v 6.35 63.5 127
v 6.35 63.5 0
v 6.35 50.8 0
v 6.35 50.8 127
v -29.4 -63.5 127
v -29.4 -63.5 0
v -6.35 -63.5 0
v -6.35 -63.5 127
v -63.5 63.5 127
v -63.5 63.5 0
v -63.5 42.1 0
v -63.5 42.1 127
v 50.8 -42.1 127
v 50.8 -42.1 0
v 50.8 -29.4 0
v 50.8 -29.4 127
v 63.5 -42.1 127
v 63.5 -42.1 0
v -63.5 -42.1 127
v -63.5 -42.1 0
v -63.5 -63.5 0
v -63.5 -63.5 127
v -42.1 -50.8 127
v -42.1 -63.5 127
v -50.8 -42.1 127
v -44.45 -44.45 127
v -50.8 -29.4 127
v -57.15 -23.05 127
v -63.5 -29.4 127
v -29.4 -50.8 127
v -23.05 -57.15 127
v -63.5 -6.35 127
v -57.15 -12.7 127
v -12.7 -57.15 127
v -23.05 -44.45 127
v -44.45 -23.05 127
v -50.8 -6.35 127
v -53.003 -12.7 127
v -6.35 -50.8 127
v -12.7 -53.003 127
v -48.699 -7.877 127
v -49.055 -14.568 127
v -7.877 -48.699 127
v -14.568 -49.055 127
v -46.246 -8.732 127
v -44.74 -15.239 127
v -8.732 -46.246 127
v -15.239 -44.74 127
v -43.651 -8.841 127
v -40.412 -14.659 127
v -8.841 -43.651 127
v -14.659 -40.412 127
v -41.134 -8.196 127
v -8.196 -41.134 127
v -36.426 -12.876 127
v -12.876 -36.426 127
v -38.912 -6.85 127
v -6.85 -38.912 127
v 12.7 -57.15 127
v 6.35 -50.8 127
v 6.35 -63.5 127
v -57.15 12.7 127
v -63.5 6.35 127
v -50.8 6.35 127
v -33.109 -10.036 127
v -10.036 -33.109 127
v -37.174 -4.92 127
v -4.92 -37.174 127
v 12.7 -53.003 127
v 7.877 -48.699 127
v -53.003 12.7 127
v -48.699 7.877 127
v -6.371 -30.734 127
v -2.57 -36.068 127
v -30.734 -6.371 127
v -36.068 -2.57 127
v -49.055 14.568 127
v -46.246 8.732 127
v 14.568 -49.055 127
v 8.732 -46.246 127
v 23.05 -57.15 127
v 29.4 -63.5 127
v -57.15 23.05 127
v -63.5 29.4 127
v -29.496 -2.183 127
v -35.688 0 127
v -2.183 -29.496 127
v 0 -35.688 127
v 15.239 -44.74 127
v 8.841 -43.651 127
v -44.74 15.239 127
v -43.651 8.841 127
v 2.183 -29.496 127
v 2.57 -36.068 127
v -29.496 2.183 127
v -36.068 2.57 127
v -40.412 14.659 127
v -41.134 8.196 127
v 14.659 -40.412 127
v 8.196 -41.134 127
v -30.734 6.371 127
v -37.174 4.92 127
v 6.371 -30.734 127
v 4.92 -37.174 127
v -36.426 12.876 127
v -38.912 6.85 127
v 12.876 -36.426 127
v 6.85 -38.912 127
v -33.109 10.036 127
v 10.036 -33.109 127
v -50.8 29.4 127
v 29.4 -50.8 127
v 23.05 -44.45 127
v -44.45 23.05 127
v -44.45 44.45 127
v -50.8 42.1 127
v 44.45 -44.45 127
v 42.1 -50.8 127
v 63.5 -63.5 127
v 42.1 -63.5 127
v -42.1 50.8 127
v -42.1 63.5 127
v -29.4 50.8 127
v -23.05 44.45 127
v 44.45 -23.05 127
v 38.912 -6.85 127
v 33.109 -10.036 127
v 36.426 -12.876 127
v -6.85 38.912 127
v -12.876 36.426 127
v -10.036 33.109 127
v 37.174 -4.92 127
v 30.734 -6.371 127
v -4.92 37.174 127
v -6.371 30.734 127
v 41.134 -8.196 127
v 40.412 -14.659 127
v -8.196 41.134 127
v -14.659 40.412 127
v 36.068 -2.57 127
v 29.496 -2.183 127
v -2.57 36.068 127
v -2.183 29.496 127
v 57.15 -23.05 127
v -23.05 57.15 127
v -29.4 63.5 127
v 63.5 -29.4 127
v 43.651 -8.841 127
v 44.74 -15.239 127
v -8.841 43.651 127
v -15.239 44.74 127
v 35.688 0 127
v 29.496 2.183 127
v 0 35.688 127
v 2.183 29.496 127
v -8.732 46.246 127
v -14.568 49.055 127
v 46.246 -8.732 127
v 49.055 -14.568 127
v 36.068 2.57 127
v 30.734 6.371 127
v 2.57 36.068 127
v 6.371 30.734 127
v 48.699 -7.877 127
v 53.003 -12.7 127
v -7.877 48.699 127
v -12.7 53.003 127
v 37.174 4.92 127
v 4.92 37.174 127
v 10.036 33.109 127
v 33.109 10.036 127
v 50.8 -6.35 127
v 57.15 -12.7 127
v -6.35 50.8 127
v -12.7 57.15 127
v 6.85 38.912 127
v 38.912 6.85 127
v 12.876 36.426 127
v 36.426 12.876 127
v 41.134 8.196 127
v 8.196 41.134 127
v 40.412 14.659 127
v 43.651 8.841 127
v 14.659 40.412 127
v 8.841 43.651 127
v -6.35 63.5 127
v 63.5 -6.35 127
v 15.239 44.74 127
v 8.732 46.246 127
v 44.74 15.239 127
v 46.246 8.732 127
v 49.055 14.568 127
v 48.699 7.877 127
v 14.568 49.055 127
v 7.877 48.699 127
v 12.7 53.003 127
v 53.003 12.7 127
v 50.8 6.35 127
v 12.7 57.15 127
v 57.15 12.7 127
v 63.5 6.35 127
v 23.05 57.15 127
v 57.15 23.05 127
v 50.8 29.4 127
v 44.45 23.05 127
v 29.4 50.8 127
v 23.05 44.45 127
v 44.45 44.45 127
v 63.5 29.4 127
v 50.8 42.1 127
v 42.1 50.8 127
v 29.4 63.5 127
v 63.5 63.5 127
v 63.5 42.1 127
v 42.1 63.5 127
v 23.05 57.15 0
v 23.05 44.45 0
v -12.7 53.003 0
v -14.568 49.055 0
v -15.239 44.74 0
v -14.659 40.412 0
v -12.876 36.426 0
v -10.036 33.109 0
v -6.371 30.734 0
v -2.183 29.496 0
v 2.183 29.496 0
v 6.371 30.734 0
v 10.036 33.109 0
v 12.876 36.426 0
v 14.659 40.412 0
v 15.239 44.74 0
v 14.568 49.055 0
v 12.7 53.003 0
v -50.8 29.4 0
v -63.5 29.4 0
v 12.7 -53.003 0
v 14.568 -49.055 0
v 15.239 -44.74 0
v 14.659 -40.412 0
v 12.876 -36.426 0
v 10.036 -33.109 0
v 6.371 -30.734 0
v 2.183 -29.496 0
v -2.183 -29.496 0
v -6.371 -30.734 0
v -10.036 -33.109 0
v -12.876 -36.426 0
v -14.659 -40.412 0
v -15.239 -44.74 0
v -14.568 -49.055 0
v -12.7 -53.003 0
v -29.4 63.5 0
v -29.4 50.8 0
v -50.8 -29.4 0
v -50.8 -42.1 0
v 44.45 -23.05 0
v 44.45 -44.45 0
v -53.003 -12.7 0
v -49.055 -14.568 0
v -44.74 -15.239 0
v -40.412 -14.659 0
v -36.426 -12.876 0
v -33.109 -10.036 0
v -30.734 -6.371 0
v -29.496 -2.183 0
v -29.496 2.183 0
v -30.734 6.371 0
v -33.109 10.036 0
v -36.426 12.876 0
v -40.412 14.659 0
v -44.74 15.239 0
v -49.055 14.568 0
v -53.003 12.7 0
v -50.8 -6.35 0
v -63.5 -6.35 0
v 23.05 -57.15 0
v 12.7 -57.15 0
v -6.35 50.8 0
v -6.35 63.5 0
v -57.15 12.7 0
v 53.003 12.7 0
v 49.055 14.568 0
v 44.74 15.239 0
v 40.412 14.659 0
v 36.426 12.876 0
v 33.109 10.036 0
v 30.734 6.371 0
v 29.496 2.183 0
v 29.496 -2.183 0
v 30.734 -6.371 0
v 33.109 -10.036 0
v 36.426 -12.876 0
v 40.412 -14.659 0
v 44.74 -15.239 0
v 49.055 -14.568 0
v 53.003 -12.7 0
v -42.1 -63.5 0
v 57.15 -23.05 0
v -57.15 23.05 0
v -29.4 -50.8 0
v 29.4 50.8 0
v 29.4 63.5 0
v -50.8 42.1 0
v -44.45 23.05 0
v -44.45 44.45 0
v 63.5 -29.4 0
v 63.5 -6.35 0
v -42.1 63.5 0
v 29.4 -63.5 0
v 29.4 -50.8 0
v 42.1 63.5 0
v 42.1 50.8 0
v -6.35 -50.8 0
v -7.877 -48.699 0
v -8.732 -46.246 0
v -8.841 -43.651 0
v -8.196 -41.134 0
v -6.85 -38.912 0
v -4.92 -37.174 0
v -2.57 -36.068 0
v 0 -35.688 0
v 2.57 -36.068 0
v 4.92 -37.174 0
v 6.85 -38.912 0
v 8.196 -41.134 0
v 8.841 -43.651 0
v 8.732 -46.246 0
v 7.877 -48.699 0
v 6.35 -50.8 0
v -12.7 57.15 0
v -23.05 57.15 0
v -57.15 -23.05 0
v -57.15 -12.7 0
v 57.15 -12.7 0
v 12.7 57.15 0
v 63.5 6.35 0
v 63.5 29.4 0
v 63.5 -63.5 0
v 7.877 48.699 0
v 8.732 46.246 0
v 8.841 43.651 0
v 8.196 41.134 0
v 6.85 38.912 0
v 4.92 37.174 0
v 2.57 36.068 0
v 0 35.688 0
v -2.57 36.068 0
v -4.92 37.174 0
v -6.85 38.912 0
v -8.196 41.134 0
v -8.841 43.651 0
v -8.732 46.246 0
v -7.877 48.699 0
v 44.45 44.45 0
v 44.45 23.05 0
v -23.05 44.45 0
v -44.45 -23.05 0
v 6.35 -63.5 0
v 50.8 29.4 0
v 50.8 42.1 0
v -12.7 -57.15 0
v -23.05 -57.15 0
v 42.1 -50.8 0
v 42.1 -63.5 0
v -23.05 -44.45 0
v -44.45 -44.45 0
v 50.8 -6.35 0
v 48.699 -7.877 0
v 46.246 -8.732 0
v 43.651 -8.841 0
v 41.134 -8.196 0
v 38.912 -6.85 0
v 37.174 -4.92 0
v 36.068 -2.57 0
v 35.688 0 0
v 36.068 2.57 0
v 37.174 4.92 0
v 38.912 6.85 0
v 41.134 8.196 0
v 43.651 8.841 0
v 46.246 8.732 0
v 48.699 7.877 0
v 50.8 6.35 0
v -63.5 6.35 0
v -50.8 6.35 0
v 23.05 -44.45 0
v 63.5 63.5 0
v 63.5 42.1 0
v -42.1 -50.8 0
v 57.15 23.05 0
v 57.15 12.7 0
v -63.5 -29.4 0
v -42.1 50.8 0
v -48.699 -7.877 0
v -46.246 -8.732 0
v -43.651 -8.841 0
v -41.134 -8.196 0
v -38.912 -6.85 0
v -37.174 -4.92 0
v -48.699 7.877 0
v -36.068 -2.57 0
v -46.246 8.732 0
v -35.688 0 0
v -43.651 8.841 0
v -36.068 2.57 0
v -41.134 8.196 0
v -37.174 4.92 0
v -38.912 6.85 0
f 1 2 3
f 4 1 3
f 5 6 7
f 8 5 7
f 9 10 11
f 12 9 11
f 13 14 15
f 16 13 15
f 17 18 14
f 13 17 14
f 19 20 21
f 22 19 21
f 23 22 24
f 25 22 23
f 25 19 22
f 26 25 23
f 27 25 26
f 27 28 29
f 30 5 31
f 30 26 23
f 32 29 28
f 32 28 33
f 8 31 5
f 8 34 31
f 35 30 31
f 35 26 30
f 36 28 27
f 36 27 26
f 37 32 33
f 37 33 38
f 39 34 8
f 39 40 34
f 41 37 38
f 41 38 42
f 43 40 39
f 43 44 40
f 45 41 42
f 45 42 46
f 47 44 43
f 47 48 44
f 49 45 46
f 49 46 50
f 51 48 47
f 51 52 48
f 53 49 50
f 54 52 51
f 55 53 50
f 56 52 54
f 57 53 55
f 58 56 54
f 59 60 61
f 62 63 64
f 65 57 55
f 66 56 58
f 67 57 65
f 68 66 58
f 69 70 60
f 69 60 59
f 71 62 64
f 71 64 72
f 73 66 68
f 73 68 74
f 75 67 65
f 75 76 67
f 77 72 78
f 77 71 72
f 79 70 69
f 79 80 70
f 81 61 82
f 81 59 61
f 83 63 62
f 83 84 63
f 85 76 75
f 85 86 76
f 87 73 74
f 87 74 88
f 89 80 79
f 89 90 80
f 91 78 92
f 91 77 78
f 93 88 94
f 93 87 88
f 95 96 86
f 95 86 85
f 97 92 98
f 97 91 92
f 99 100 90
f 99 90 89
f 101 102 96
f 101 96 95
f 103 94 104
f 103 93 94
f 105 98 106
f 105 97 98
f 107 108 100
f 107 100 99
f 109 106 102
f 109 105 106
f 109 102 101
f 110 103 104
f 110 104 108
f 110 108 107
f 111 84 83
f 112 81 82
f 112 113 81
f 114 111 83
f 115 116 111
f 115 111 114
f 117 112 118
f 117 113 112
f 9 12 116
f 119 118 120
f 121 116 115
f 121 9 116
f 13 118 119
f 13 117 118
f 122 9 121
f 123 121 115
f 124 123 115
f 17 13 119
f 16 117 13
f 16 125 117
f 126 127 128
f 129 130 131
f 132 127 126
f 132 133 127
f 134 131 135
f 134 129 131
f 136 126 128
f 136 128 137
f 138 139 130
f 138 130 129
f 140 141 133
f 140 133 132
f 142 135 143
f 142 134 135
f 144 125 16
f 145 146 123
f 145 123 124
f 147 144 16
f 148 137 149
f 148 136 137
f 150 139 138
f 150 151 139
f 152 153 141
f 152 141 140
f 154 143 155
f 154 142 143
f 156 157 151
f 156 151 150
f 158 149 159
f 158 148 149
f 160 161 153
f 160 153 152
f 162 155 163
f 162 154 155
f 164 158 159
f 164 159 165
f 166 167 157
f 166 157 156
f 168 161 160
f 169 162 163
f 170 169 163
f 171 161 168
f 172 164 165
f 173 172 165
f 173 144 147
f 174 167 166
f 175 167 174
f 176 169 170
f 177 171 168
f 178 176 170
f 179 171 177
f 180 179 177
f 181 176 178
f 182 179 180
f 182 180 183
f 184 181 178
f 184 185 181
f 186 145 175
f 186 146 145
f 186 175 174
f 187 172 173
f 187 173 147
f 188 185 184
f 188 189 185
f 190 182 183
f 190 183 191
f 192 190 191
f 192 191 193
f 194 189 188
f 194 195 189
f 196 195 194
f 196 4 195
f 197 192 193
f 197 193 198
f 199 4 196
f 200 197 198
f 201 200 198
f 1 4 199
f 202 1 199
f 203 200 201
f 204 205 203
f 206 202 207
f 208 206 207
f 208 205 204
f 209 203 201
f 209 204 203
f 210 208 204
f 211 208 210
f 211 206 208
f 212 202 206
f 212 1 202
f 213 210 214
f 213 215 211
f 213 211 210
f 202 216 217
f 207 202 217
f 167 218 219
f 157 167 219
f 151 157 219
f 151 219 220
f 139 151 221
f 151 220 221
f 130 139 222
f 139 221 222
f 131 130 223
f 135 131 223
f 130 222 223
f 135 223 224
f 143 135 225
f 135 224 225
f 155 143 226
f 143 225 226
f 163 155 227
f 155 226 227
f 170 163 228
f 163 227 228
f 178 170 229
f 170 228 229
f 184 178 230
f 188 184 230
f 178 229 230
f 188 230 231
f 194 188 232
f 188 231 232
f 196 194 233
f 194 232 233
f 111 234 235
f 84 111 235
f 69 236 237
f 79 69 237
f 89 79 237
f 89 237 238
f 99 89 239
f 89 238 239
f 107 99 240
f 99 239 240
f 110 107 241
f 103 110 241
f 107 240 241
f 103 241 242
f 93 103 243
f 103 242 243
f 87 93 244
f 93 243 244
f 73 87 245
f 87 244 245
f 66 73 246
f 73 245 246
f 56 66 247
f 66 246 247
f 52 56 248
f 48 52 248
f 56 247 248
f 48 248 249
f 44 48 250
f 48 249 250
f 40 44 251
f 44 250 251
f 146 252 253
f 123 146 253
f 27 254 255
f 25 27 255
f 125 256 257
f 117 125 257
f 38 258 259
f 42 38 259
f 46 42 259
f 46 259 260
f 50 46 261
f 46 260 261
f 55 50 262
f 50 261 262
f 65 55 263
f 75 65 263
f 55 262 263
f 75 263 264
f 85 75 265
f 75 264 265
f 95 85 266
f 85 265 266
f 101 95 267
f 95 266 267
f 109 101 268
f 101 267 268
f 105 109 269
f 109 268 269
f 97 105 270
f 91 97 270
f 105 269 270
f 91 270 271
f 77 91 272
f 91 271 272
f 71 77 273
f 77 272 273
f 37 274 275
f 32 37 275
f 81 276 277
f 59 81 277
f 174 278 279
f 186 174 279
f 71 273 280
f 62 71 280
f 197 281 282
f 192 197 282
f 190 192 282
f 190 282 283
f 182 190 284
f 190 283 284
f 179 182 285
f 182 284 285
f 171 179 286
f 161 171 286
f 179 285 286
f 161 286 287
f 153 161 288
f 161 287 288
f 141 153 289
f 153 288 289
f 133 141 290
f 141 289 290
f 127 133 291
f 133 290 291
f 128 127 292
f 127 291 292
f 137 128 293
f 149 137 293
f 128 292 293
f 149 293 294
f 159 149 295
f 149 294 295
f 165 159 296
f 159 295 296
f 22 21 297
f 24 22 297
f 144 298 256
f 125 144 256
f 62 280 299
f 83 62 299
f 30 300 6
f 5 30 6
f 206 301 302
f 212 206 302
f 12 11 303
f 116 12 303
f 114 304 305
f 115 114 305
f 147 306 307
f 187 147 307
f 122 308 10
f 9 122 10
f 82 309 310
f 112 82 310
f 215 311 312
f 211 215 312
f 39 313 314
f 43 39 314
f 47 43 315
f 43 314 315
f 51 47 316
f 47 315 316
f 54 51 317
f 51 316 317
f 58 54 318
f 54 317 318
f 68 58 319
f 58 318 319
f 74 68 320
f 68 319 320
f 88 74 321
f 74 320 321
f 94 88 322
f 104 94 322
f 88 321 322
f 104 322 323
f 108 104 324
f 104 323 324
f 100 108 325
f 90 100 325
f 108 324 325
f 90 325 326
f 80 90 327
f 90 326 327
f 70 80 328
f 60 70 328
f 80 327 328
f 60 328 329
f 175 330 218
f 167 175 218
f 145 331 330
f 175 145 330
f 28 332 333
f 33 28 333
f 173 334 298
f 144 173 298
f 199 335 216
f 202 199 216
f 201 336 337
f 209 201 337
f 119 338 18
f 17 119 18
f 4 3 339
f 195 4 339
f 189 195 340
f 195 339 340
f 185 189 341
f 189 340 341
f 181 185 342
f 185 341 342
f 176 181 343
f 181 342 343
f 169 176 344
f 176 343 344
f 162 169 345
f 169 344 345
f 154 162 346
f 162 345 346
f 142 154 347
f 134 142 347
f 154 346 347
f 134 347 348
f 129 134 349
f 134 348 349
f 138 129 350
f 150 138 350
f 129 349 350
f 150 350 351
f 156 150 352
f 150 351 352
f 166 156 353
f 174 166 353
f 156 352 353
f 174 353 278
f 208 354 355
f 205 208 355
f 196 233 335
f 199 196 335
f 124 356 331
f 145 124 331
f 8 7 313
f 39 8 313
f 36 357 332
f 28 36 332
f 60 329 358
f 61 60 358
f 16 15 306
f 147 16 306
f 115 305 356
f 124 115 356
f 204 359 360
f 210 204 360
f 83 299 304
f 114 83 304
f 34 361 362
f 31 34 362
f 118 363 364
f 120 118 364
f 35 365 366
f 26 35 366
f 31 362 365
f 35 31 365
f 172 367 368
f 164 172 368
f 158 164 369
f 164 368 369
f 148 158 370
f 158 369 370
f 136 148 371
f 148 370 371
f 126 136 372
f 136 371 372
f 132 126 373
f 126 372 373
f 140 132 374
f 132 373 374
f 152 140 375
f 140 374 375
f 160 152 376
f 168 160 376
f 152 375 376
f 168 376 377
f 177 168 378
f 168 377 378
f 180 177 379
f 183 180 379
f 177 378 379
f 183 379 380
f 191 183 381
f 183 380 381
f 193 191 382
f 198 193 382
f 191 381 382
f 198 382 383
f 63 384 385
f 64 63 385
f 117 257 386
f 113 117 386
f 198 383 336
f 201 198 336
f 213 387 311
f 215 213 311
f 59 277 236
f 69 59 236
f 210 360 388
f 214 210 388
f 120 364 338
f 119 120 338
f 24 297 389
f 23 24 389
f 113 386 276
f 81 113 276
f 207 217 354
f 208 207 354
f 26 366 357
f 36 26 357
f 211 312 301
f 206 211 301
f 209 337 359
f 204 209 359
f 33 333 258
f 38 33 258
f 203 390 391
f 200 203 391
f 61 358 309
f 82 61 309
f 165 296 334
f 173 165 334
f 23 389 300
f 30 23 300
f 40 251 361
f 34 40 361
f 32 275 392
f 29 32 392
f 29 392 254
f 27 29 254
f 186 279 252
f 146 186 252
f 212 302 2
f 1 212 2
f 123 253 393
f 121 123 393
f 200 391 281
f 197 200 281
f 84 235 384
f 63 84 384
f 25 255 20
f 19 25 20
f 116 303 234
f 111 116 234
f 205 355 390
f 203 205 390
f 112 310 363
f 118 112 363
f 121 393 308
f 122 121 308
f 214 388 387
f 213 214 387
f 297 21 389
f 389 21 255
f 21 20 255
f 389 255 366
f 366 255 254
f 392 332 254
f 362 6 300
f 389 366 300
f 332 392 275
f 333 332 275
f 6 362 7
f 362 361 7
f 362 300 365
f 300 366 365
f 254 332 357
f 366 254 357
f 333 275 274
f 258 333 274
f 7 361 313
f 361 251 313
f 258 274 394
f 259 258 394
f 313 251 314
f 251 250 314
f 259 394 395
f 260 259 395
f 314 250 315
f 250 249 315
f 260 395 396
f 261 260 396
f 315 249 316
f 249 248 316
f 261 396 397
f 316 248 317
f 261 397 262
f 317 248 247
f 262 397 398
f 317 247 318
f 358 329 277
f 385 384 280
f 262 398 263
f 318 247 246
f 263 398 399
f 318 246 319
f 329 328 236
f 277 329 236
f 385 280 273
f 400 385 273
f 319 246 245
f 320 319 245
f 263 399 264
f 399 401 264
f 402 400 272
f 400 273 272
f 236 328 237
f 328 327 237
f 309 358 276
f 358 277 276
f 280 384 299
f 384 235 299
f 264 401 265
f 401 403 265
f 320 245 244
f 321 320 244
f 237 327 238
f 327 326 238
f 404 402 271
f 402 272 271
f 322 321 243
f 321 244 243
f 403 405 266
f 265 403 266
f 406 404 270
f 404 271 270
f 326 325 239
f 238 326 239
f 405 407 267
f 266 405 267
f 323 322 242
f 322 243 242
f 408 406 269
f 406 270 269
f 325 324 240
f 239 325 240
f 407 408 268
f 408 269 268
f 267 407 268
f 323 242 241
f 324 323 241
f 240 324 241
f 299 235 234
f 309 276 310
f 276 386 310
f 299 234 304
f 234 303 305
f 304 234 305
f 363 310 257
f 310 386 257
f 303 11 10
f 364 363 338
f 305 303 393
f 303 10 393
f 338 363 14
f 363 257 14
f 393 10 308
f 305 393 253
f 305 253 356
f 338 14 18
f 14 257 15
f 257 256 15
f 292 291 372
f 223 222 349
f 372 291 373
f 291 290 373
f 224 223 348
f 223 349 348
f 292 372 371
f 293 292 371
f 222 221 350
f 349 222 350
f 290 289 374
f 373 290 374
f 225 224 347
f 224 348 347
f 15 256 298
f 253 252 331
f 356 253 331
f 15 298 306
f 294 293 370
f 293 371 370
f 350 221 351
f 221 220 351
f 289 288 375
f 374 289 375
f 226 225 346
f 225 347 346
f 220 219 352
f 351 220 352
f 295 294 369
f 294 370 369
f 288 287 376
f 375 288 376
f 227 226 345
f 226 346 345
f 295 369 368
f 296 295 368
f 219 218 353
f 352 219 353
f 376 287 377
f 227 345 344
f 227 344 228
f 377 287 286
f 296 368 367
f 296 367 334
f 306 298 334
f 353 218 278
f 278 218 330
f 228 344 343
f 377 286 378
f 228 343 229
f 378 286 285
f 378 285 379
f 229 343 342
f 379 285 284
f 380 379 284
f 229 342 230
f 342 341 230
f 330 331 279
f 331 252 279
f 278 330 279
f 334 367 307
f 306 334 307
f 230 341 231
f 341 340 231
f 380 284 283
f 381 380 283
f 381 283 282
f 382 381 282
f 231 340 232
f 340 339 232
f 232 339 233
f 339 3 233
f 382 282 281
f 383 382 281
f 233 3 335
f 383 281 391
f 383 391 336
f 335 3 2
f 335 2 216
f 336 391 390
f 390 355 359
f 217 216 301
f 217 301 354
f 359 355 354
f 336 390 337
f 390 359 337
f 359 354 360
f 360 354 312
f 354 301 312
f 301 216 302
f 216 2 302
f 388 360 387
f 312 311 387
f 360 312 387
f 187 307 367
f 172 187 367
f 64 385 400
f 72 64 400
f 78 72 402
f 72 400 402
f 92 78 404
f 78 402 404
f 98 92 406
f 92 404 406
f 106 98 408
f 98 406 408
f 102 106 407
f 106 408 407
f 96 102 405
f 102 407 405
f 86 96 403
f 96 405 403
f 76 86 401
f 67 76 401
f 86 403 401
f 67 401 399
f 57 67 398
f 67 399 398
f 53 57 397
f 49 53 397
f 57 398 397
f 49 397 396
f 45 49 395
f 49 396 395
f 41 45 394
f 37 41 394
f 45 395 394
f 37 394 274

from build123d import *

# Parameters (mm, degrees)
F1_DEPTH = 127


with BuildPart() as f1:
    # F0 (on Top) → F1 (new body)
    with BuildSketch(Plane.XY):
        with BuildLine():
            Line((-42.099868, 63.5), (-63.5, 63.5))
            Line((-63.5, 63.5), (-63.5, 42.099868))
            Line((-63.5, 42.099868), (-50.8, 42.099868))
            Line((-50.8, 42.099868), (-50.8, 29.399868))
            Line((-50.8, 29.399868), (-63.5, 29.399868))
            Line((-63.5, 29.399868), (-63.5, 6.35))
            Line((-63.5, 6.35), (-50.8, 6.35))
            ThreePointArc((-50.8, 6.35), (-35.688296, 0), (-50.8, -6.35))
            Line((-50.8, -6.35), (-63.5, -6.35))
            Line((-63.5, -6.35), (-63.5, -29.399868))
            Line((-63.5, -29.399868), (-50.8, -29.399868))
            Line((-50.8, -29.399868), (-50.8, -42.099868))
            Line((-50.8, -42.099868), (-63.5, -42.099868))
            Line((-63.5, -42.099868), (-63.5, -63.5))
            Line((-63.5, -63.5), (-42.099868, -63.5))
            Line((-42.099868, -63.5), (-42.099868, -50.8))
            Line((-42.099868, -50.8), (-29.399868, -50.8))
            Line((-29.399868, -50.8), (-29.399868, -63.5))
            Line((-29.399868, -63.5), (-6.35, -63.5))
            Line((-6.35, -63.5), (-6.35, -50.8))
            ThreePointArc((-6.35, -50.8), (0, -35.688296), (6.35, -50.8))
            Line((6.35, -50.8), (6.35, -63.5))
            Line((6.35, -63.5), (29.399868, -63.5))
            Line((29.399868, -63.5), (29.399868, -50.8))
            Line((29.399868, -50.8), (42.099868, -50.8))
            Line((42.099868, -50.8), (42.099868, -63.5))
            Line((42.099868, -63.5), (63.5, -63.5))
            Line((63.5, -63.5), (63.5, -42.099868))
            Line((63.5, -42.099868), (50.8, -42.099868))
            Line((50.8, -42.099868), (50.8, -29.399868))
            Line((50.8, -29.399868), (63.5, -29.399868))
            Line((63.5, -29.399868), (63.5, -6.35))
            Line((63.5, -6.35), (50.8, -6.35))
            ThreePointArc((50.8, -6.35), (35.688296, 0), (50.8, 6.35))
            Line((50.8, 6.35), (63.5, 6.35))
            Line((63.5, 6.35), (63.5, 29.399868))
            Line((63.5, 29.399868), (50.8, 29.399868))
            Line((50.8, 29.399868), (50.8, 42.099868))
            Line((50.8, 42.099868), (63.5, 42.099868))
            Line((63.5, 42.099868), (63.5, 63.5))
            Line((63.5, 63.5), (42.099868, 63.5))
            Line((42.099868, 63.5), (42.099868, 50.8))
            Line((42.099868, 50.8), (29.399868, 50.8))
            Line((29.399868, 50.8), (29.399868, 63.5))
            Line((29.399868, 63.5), (6.35, 63.5))
            Line((6.35, 63.5), (6.35, 50.8))
            ThreePointArc((6.35, 50.8), (0, 35.688296), (-6.35, 50.8))
            Line((-6.35, 50.8), (-6.35, 63.5))
            Line((-6.35, 63.5), (-29.399868, 63.5))
            Line((-29.399868, 63.5), (-29.399868, 50.8))
            Line((-29.399868, 50.8), (-42.099868, 50.8))
            Line((-42.099868, 50.8), (-42.099868, 63.5))
        make_face()
        with BuildLine():
            Line((-57.15, 23.049868), (-44.45, 23.049868))
            Line((-44.45, 23.049868), (-44.45, 44.45))
            Line((-44.45, 44.45), (-23.049868, 44.45))
            Line((-23.049868, 44.45), (-23.049868, 57.15))
            Line((-23.049868, 57.15), (-12.7, 57.15))
            Line((-12.7, 57.15), (-12.7, 53.002523))
            ThreePointArc((-12.7, 53.002523), (0, 29.338296), (12.7, 53.002523))
            Line((12.7, 53.002523), (12.7, 57.15))
            Line((12.7, 57.15), (23.049868, 57.15))
            Line((23.049868, 57.15), (23.049868, 44.45))
            Line((23.049868, 44.45), (44.45, 44.45))
            Line((44.45, 44.45), (44.45, 23.049868))
            Line((44.45, 23.049868), (57.15, 23.049868))
            Line((57.15, 23.049868), (57.15, 12.7))
            Line((57.15, 12.7), (53.002523, 12.7))
            ThreePointArc((53.002523, 12.7), (29.338296, 0), (53.002523, -12.7))
            Line((53.002523, -12.7), (57.15, -12.7))
            Line((57.15, -12.7), (57.15, -23.049868))
            Line((57.15, -23.049868), (44.45, -23.049868))
            Line((44.45, -23.049868), (44.45, -44.45))
            Line((44.45, -44.45), (23.049868, -44.45))
            Line((23.049868, -44.45), (23.049868, -57.15))
            Line((23.049868, -57.15), (12.7, -57.15))
            Line((12.7, -57.15), (12.7, -53.002523))
            ThreePointArc((12.7, -53.002523), (0, -29.338296), (-12.7, -53.002523))
            Line((-12.7, -53.002523), (-12.7, -57.15))
            Line((-12.7, -57.15), (-23.049868, -57.15))
            Line((-23.049868, -57.15), (-23.049868, -44.45))
            Line((-23.049868, -44.45), (-44.45, -44.45))
            Line((-44.45, -44.45), (-44.45, -23.049868))
            Line((-44.45, -23.049868), (-57.15, -23.049868))
            Line((-57.15, -23.049868), (-57.15, -12.7))
            Line((-57.15, -12.7), (-53.002523, -12.7))
            ThreePointArc((-53.002523, -12.7), (-29.338296, 0), (-53.002523, 12.7))
            Line((-53.002523, 12.7), (-57.15, 12.7))
            Line((-57.15, 12.7), (-57.15, 23.049868))
        make_face(mode=Mode.SUBTRACT)
    extrude(amount=F1_DEPTH)


solid = f1.part
